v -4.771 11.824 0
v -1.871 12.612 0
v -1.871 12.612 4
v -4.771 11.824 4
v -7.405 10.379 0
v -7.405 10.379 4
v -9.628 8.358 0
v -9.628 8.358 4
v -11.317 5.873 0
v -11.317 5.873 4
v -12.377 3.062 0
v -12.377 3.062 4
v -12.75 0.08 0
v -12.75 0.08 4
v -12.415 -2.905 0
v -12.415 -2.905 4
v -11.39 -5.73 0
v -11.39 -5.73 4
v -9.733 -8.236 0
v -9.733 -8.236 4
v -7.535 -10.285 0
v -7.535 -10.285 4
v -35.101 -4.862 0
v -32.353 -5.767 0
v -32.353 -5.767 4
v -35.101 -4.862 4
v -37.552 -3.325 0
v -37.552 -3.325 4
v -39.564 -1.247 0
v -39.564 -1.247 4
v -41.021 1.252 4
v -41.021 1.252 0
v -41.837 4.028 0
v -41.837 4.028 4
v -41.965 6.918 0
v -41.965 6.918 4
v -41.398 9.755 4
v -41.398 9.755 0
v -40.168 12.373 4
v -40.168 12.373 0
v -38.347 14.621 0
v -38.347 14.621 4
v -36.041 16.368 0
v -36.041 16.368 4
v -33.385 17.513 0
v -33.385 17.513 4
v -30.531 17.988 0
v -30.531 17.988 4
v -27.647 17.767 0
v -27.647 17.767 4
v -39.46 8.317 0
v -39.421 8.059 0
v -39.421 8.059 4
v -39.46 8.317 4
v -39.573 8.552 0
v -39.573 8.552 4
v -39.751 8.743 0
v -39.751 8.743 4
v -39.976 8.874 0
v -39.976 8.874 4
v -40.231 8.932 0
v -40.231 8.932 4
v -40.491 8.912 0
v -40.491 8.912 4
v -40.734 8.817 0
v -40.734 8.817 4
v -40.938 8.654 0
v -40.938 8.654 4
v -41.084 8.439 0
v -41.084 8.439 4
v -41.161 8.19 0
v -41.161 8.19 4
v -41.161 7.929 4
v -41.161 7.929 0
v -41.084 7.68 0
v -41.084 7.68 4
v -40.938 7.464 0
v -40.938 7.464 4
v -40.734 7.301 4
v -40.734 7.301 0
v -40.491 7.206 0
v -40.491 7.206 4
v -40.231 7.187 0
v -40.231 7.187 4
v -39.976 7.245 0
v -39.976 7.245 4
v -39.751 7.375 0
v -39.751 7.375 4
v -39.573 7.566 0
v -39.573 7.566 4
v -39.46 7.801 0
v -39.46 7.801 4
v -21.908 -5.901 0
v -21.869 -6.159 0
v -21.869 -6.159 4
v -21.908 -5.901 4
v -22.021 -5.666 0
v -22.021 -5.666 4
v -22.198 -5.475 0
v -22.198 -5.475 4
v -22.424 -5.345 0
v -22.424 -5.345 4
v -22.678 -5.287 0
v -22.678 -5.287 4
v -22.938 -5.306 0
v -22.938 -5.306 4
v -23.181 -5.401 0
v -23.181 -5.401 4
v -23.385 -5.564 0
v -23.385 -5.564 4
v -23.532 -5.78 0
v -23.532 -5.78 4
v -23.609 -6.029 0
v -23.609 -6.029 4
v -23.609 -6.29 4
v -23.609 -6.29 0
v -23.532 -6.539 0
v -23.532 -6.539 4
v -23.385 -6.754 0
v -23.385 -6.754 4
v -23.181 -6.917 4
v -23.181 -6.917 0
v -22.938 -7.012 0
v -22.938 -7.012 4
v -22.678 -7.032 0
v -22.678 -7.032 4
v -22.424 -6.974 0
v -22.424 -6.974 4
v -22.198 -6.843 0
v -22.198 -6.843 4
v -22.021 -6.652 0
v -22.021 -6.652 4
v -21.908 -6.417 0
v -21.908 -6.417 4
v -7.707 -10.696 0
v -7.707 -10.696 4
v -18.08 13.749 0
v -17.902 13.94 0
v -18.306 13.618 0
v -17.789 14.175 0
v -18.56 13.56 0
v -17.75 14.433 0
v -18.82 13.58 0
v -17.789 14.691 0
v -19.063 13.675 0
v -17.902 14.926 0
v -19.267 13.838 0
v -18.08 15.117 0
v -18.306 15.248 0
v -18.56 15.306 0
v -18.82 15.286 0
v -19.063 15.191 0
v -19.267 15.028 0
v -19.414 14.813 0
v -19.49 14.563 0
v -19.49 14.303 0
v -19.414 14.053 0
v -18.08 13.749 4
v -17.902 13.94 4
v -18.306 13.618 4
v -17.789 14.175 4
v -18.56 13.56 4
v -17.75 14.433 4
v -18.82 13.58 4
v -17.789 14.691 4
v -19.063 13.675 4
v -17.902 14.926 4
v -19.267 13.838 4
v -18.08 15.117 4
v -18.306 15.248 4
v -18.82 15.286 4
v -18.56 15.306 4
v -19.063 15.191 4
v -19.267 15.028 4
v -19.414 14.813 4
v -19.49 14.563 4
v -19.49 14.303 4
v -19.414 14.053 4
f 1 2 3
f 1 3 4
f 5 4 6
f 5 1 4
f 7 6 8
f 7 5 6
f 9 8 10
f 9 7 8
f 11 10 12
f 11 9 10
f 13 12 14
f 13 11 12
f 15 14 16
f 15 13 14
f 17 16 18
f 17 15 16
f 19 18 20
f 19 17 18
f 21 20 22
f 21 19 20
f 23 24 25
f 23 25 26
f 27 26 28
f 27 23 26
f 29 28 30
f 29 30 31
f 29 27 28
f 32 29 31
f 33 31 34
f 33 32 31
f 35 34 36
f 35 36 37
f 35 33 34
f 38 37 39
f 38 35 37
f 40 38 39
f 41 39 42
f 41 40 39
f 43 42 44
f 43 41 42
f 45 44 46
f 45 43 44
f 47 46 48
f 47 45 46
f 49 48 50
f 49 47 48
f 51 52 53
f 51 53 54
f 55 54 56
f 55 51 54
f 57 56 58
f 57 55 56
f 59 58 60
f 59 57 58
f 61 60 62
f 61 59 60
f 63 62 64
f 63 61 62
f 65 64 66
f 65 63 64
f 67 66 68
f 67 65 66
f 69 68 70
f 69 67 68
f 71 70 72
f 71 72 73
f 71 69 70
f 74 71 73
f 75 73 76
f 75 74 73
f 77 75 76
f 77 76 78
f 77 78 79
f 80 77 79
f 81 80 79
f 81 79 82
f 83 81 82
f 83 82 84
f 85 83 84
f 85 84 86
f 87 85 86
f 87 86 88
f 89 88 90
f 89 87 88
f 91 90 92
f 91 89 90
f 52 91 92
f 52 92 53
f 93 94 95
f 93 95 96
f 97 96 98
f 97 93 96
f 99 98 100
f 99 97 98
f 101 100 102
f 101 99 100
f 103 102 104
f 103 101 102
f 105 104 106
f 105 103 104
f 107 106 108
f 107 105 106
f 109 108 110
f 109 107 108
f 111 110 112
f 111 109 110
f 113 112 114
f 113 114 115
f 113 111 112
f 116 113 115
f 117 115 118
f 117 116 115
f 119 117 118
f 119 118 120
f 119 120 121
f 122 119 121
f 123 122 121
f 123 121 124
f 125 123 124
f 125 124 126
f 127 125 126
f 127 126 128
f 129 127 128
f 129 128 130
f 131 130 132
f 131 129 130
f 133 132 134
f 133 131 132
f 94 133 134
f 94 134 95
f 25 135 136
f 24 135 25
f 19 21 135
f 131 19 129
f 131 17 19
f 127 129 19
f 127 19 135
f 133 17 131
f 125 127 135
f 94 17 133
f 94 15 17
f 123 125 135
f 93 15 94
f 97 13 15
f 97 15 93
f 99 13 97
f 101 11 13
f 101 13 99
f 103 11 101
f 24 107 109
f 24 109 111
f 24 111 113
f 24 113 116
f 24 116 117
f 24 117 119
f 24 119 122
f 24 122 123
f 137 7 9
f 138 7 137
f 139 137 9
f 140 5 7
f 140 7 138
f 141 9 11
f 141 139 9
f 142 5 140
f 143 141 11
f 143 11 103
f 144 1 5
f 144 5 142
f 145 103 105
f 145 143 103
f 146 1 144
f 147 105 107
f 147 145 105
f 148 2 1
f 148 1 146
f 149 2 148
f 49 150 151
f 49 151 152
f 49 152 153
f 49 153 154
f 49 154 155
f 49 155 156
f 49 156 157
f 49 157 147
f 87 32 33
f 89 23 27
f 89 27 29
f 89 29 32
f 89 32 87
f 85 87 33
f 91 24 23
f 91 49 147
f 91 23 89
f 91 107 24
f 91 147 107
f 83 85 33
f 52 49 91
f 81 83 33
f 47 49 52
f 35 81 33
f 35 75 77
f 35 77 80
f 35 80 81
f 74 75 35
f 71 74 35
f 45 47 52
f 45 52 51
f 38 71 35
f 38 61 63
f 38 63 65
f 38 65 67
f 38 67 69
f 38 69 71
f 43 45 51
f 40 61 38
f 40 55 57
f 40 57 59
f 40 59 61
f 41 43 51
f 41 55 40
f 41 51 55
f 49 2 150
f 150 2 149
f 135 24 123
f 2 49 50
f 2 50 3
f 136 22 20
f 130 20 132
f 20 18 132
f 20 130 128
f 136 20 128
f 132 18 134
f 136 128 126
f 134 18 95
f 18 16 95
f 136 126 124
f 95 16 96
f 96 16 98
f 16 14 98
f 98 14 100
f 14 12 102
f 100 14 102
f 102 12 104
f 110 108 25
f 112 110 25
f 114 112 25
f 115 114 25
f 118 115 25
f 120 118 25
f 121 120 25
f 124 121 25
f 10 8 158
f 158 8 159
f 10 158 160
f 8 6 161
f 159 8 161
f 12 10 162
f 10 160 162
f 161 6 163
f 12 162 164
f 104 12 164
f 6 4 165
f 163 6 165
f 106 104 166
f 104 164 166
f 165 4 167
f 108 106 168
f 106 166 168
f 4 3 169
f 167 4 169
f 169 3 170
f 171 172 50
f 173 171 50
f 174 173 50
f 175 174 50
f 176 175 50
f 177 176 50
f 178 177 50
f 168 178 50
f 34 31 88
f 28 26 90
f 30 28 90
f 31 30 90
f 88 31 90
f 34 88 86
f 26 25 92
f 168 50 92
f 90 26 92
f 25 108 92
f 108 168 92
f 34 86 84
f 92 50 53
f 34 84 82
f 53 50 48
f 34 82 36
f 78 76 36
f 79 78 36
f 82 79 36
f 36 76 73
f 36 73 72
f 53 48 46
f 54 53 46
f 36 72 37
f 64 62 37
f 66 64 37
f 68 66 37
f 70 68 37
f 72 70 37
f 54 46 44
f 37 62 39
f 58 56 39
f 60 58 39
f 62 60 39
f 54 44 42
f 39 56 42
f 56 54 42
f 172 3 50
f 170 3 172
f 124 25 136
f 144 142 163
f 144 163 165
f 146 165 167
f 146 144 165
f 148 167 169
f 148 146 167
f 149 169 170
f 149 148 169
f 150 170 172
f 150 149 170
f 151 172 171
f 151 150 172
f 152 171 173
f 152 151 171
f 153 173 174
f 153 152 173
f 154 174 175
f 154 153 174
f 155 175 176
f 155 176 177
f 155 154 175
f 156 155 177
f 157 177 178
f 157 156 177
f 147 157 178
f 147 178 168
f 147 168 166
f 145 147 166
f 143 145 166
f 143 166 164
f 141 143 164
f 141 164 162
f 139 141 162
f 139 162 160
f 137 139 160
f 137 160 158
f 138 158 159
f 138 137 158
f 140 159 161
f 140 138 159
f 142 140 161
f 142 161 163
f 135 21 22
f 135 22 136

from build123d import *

# Parameters (mm, degrees)
SKETCH1_R           = 0.875
BOSS_EXTRUDE1_DEPTH = 4
CUT_EXTRUDE1_DEPTH  = 10


with BuildPart() as part:
    # Sketch1 → Boss-Extrude1 (new body)
    with BuildSketch(Plane.XY):
        with BuildLine():
            Line((-27.646606378, 17.766968108), (-1.871361719, 12.611919177))
            ThreePointArc((-1.871361719, 12.611919177), (-12.502403615, 2.500480723), (-6.578148963, -10.92201704))
            Line((-6.578148963, -10.92201704), (-32.353393622, -5.766968108))
            ThreePointArc((-32.353393622, -5.766968108), (-41.766968108, 8.353393622), (-27.646606378, 17.766968108))
        make_face()
        with Locations((-40.296097095, 8.059219419)):
            Circle(SKETCH1_R, mode=Mode.SUBTRACT)
        with Locations((-18.625264162, 14.432993811)):
            Circle(SKETCH1_R, mode=Mode.SUBTRACT)
        with Locations((-22.743703, -6.159200379)):
            Circle(SKETCH1_R, mode=Mode.SUBTRACT)
    extrude(amount=BOSS_EXTRUDE1_DEPTH)

    # Sketch2 → Cut-Extrude1 (cut)
    with BuildSketch(Plane(origin=(0, 0, 0), x_dir=(-1, 0, 0), z_dir=(0, 0, -1))):
        Polygon((7.192307692, -9.461538462), (7.961538462, -11.307692308), (6.115384615, -12.076923077), (5.346153846, -10.230769231), align=None)
    extrude(amount=-CUT_EXTRUDE1_DEPTH, mode=Mode.SUBTRACT)


solid = part.part
